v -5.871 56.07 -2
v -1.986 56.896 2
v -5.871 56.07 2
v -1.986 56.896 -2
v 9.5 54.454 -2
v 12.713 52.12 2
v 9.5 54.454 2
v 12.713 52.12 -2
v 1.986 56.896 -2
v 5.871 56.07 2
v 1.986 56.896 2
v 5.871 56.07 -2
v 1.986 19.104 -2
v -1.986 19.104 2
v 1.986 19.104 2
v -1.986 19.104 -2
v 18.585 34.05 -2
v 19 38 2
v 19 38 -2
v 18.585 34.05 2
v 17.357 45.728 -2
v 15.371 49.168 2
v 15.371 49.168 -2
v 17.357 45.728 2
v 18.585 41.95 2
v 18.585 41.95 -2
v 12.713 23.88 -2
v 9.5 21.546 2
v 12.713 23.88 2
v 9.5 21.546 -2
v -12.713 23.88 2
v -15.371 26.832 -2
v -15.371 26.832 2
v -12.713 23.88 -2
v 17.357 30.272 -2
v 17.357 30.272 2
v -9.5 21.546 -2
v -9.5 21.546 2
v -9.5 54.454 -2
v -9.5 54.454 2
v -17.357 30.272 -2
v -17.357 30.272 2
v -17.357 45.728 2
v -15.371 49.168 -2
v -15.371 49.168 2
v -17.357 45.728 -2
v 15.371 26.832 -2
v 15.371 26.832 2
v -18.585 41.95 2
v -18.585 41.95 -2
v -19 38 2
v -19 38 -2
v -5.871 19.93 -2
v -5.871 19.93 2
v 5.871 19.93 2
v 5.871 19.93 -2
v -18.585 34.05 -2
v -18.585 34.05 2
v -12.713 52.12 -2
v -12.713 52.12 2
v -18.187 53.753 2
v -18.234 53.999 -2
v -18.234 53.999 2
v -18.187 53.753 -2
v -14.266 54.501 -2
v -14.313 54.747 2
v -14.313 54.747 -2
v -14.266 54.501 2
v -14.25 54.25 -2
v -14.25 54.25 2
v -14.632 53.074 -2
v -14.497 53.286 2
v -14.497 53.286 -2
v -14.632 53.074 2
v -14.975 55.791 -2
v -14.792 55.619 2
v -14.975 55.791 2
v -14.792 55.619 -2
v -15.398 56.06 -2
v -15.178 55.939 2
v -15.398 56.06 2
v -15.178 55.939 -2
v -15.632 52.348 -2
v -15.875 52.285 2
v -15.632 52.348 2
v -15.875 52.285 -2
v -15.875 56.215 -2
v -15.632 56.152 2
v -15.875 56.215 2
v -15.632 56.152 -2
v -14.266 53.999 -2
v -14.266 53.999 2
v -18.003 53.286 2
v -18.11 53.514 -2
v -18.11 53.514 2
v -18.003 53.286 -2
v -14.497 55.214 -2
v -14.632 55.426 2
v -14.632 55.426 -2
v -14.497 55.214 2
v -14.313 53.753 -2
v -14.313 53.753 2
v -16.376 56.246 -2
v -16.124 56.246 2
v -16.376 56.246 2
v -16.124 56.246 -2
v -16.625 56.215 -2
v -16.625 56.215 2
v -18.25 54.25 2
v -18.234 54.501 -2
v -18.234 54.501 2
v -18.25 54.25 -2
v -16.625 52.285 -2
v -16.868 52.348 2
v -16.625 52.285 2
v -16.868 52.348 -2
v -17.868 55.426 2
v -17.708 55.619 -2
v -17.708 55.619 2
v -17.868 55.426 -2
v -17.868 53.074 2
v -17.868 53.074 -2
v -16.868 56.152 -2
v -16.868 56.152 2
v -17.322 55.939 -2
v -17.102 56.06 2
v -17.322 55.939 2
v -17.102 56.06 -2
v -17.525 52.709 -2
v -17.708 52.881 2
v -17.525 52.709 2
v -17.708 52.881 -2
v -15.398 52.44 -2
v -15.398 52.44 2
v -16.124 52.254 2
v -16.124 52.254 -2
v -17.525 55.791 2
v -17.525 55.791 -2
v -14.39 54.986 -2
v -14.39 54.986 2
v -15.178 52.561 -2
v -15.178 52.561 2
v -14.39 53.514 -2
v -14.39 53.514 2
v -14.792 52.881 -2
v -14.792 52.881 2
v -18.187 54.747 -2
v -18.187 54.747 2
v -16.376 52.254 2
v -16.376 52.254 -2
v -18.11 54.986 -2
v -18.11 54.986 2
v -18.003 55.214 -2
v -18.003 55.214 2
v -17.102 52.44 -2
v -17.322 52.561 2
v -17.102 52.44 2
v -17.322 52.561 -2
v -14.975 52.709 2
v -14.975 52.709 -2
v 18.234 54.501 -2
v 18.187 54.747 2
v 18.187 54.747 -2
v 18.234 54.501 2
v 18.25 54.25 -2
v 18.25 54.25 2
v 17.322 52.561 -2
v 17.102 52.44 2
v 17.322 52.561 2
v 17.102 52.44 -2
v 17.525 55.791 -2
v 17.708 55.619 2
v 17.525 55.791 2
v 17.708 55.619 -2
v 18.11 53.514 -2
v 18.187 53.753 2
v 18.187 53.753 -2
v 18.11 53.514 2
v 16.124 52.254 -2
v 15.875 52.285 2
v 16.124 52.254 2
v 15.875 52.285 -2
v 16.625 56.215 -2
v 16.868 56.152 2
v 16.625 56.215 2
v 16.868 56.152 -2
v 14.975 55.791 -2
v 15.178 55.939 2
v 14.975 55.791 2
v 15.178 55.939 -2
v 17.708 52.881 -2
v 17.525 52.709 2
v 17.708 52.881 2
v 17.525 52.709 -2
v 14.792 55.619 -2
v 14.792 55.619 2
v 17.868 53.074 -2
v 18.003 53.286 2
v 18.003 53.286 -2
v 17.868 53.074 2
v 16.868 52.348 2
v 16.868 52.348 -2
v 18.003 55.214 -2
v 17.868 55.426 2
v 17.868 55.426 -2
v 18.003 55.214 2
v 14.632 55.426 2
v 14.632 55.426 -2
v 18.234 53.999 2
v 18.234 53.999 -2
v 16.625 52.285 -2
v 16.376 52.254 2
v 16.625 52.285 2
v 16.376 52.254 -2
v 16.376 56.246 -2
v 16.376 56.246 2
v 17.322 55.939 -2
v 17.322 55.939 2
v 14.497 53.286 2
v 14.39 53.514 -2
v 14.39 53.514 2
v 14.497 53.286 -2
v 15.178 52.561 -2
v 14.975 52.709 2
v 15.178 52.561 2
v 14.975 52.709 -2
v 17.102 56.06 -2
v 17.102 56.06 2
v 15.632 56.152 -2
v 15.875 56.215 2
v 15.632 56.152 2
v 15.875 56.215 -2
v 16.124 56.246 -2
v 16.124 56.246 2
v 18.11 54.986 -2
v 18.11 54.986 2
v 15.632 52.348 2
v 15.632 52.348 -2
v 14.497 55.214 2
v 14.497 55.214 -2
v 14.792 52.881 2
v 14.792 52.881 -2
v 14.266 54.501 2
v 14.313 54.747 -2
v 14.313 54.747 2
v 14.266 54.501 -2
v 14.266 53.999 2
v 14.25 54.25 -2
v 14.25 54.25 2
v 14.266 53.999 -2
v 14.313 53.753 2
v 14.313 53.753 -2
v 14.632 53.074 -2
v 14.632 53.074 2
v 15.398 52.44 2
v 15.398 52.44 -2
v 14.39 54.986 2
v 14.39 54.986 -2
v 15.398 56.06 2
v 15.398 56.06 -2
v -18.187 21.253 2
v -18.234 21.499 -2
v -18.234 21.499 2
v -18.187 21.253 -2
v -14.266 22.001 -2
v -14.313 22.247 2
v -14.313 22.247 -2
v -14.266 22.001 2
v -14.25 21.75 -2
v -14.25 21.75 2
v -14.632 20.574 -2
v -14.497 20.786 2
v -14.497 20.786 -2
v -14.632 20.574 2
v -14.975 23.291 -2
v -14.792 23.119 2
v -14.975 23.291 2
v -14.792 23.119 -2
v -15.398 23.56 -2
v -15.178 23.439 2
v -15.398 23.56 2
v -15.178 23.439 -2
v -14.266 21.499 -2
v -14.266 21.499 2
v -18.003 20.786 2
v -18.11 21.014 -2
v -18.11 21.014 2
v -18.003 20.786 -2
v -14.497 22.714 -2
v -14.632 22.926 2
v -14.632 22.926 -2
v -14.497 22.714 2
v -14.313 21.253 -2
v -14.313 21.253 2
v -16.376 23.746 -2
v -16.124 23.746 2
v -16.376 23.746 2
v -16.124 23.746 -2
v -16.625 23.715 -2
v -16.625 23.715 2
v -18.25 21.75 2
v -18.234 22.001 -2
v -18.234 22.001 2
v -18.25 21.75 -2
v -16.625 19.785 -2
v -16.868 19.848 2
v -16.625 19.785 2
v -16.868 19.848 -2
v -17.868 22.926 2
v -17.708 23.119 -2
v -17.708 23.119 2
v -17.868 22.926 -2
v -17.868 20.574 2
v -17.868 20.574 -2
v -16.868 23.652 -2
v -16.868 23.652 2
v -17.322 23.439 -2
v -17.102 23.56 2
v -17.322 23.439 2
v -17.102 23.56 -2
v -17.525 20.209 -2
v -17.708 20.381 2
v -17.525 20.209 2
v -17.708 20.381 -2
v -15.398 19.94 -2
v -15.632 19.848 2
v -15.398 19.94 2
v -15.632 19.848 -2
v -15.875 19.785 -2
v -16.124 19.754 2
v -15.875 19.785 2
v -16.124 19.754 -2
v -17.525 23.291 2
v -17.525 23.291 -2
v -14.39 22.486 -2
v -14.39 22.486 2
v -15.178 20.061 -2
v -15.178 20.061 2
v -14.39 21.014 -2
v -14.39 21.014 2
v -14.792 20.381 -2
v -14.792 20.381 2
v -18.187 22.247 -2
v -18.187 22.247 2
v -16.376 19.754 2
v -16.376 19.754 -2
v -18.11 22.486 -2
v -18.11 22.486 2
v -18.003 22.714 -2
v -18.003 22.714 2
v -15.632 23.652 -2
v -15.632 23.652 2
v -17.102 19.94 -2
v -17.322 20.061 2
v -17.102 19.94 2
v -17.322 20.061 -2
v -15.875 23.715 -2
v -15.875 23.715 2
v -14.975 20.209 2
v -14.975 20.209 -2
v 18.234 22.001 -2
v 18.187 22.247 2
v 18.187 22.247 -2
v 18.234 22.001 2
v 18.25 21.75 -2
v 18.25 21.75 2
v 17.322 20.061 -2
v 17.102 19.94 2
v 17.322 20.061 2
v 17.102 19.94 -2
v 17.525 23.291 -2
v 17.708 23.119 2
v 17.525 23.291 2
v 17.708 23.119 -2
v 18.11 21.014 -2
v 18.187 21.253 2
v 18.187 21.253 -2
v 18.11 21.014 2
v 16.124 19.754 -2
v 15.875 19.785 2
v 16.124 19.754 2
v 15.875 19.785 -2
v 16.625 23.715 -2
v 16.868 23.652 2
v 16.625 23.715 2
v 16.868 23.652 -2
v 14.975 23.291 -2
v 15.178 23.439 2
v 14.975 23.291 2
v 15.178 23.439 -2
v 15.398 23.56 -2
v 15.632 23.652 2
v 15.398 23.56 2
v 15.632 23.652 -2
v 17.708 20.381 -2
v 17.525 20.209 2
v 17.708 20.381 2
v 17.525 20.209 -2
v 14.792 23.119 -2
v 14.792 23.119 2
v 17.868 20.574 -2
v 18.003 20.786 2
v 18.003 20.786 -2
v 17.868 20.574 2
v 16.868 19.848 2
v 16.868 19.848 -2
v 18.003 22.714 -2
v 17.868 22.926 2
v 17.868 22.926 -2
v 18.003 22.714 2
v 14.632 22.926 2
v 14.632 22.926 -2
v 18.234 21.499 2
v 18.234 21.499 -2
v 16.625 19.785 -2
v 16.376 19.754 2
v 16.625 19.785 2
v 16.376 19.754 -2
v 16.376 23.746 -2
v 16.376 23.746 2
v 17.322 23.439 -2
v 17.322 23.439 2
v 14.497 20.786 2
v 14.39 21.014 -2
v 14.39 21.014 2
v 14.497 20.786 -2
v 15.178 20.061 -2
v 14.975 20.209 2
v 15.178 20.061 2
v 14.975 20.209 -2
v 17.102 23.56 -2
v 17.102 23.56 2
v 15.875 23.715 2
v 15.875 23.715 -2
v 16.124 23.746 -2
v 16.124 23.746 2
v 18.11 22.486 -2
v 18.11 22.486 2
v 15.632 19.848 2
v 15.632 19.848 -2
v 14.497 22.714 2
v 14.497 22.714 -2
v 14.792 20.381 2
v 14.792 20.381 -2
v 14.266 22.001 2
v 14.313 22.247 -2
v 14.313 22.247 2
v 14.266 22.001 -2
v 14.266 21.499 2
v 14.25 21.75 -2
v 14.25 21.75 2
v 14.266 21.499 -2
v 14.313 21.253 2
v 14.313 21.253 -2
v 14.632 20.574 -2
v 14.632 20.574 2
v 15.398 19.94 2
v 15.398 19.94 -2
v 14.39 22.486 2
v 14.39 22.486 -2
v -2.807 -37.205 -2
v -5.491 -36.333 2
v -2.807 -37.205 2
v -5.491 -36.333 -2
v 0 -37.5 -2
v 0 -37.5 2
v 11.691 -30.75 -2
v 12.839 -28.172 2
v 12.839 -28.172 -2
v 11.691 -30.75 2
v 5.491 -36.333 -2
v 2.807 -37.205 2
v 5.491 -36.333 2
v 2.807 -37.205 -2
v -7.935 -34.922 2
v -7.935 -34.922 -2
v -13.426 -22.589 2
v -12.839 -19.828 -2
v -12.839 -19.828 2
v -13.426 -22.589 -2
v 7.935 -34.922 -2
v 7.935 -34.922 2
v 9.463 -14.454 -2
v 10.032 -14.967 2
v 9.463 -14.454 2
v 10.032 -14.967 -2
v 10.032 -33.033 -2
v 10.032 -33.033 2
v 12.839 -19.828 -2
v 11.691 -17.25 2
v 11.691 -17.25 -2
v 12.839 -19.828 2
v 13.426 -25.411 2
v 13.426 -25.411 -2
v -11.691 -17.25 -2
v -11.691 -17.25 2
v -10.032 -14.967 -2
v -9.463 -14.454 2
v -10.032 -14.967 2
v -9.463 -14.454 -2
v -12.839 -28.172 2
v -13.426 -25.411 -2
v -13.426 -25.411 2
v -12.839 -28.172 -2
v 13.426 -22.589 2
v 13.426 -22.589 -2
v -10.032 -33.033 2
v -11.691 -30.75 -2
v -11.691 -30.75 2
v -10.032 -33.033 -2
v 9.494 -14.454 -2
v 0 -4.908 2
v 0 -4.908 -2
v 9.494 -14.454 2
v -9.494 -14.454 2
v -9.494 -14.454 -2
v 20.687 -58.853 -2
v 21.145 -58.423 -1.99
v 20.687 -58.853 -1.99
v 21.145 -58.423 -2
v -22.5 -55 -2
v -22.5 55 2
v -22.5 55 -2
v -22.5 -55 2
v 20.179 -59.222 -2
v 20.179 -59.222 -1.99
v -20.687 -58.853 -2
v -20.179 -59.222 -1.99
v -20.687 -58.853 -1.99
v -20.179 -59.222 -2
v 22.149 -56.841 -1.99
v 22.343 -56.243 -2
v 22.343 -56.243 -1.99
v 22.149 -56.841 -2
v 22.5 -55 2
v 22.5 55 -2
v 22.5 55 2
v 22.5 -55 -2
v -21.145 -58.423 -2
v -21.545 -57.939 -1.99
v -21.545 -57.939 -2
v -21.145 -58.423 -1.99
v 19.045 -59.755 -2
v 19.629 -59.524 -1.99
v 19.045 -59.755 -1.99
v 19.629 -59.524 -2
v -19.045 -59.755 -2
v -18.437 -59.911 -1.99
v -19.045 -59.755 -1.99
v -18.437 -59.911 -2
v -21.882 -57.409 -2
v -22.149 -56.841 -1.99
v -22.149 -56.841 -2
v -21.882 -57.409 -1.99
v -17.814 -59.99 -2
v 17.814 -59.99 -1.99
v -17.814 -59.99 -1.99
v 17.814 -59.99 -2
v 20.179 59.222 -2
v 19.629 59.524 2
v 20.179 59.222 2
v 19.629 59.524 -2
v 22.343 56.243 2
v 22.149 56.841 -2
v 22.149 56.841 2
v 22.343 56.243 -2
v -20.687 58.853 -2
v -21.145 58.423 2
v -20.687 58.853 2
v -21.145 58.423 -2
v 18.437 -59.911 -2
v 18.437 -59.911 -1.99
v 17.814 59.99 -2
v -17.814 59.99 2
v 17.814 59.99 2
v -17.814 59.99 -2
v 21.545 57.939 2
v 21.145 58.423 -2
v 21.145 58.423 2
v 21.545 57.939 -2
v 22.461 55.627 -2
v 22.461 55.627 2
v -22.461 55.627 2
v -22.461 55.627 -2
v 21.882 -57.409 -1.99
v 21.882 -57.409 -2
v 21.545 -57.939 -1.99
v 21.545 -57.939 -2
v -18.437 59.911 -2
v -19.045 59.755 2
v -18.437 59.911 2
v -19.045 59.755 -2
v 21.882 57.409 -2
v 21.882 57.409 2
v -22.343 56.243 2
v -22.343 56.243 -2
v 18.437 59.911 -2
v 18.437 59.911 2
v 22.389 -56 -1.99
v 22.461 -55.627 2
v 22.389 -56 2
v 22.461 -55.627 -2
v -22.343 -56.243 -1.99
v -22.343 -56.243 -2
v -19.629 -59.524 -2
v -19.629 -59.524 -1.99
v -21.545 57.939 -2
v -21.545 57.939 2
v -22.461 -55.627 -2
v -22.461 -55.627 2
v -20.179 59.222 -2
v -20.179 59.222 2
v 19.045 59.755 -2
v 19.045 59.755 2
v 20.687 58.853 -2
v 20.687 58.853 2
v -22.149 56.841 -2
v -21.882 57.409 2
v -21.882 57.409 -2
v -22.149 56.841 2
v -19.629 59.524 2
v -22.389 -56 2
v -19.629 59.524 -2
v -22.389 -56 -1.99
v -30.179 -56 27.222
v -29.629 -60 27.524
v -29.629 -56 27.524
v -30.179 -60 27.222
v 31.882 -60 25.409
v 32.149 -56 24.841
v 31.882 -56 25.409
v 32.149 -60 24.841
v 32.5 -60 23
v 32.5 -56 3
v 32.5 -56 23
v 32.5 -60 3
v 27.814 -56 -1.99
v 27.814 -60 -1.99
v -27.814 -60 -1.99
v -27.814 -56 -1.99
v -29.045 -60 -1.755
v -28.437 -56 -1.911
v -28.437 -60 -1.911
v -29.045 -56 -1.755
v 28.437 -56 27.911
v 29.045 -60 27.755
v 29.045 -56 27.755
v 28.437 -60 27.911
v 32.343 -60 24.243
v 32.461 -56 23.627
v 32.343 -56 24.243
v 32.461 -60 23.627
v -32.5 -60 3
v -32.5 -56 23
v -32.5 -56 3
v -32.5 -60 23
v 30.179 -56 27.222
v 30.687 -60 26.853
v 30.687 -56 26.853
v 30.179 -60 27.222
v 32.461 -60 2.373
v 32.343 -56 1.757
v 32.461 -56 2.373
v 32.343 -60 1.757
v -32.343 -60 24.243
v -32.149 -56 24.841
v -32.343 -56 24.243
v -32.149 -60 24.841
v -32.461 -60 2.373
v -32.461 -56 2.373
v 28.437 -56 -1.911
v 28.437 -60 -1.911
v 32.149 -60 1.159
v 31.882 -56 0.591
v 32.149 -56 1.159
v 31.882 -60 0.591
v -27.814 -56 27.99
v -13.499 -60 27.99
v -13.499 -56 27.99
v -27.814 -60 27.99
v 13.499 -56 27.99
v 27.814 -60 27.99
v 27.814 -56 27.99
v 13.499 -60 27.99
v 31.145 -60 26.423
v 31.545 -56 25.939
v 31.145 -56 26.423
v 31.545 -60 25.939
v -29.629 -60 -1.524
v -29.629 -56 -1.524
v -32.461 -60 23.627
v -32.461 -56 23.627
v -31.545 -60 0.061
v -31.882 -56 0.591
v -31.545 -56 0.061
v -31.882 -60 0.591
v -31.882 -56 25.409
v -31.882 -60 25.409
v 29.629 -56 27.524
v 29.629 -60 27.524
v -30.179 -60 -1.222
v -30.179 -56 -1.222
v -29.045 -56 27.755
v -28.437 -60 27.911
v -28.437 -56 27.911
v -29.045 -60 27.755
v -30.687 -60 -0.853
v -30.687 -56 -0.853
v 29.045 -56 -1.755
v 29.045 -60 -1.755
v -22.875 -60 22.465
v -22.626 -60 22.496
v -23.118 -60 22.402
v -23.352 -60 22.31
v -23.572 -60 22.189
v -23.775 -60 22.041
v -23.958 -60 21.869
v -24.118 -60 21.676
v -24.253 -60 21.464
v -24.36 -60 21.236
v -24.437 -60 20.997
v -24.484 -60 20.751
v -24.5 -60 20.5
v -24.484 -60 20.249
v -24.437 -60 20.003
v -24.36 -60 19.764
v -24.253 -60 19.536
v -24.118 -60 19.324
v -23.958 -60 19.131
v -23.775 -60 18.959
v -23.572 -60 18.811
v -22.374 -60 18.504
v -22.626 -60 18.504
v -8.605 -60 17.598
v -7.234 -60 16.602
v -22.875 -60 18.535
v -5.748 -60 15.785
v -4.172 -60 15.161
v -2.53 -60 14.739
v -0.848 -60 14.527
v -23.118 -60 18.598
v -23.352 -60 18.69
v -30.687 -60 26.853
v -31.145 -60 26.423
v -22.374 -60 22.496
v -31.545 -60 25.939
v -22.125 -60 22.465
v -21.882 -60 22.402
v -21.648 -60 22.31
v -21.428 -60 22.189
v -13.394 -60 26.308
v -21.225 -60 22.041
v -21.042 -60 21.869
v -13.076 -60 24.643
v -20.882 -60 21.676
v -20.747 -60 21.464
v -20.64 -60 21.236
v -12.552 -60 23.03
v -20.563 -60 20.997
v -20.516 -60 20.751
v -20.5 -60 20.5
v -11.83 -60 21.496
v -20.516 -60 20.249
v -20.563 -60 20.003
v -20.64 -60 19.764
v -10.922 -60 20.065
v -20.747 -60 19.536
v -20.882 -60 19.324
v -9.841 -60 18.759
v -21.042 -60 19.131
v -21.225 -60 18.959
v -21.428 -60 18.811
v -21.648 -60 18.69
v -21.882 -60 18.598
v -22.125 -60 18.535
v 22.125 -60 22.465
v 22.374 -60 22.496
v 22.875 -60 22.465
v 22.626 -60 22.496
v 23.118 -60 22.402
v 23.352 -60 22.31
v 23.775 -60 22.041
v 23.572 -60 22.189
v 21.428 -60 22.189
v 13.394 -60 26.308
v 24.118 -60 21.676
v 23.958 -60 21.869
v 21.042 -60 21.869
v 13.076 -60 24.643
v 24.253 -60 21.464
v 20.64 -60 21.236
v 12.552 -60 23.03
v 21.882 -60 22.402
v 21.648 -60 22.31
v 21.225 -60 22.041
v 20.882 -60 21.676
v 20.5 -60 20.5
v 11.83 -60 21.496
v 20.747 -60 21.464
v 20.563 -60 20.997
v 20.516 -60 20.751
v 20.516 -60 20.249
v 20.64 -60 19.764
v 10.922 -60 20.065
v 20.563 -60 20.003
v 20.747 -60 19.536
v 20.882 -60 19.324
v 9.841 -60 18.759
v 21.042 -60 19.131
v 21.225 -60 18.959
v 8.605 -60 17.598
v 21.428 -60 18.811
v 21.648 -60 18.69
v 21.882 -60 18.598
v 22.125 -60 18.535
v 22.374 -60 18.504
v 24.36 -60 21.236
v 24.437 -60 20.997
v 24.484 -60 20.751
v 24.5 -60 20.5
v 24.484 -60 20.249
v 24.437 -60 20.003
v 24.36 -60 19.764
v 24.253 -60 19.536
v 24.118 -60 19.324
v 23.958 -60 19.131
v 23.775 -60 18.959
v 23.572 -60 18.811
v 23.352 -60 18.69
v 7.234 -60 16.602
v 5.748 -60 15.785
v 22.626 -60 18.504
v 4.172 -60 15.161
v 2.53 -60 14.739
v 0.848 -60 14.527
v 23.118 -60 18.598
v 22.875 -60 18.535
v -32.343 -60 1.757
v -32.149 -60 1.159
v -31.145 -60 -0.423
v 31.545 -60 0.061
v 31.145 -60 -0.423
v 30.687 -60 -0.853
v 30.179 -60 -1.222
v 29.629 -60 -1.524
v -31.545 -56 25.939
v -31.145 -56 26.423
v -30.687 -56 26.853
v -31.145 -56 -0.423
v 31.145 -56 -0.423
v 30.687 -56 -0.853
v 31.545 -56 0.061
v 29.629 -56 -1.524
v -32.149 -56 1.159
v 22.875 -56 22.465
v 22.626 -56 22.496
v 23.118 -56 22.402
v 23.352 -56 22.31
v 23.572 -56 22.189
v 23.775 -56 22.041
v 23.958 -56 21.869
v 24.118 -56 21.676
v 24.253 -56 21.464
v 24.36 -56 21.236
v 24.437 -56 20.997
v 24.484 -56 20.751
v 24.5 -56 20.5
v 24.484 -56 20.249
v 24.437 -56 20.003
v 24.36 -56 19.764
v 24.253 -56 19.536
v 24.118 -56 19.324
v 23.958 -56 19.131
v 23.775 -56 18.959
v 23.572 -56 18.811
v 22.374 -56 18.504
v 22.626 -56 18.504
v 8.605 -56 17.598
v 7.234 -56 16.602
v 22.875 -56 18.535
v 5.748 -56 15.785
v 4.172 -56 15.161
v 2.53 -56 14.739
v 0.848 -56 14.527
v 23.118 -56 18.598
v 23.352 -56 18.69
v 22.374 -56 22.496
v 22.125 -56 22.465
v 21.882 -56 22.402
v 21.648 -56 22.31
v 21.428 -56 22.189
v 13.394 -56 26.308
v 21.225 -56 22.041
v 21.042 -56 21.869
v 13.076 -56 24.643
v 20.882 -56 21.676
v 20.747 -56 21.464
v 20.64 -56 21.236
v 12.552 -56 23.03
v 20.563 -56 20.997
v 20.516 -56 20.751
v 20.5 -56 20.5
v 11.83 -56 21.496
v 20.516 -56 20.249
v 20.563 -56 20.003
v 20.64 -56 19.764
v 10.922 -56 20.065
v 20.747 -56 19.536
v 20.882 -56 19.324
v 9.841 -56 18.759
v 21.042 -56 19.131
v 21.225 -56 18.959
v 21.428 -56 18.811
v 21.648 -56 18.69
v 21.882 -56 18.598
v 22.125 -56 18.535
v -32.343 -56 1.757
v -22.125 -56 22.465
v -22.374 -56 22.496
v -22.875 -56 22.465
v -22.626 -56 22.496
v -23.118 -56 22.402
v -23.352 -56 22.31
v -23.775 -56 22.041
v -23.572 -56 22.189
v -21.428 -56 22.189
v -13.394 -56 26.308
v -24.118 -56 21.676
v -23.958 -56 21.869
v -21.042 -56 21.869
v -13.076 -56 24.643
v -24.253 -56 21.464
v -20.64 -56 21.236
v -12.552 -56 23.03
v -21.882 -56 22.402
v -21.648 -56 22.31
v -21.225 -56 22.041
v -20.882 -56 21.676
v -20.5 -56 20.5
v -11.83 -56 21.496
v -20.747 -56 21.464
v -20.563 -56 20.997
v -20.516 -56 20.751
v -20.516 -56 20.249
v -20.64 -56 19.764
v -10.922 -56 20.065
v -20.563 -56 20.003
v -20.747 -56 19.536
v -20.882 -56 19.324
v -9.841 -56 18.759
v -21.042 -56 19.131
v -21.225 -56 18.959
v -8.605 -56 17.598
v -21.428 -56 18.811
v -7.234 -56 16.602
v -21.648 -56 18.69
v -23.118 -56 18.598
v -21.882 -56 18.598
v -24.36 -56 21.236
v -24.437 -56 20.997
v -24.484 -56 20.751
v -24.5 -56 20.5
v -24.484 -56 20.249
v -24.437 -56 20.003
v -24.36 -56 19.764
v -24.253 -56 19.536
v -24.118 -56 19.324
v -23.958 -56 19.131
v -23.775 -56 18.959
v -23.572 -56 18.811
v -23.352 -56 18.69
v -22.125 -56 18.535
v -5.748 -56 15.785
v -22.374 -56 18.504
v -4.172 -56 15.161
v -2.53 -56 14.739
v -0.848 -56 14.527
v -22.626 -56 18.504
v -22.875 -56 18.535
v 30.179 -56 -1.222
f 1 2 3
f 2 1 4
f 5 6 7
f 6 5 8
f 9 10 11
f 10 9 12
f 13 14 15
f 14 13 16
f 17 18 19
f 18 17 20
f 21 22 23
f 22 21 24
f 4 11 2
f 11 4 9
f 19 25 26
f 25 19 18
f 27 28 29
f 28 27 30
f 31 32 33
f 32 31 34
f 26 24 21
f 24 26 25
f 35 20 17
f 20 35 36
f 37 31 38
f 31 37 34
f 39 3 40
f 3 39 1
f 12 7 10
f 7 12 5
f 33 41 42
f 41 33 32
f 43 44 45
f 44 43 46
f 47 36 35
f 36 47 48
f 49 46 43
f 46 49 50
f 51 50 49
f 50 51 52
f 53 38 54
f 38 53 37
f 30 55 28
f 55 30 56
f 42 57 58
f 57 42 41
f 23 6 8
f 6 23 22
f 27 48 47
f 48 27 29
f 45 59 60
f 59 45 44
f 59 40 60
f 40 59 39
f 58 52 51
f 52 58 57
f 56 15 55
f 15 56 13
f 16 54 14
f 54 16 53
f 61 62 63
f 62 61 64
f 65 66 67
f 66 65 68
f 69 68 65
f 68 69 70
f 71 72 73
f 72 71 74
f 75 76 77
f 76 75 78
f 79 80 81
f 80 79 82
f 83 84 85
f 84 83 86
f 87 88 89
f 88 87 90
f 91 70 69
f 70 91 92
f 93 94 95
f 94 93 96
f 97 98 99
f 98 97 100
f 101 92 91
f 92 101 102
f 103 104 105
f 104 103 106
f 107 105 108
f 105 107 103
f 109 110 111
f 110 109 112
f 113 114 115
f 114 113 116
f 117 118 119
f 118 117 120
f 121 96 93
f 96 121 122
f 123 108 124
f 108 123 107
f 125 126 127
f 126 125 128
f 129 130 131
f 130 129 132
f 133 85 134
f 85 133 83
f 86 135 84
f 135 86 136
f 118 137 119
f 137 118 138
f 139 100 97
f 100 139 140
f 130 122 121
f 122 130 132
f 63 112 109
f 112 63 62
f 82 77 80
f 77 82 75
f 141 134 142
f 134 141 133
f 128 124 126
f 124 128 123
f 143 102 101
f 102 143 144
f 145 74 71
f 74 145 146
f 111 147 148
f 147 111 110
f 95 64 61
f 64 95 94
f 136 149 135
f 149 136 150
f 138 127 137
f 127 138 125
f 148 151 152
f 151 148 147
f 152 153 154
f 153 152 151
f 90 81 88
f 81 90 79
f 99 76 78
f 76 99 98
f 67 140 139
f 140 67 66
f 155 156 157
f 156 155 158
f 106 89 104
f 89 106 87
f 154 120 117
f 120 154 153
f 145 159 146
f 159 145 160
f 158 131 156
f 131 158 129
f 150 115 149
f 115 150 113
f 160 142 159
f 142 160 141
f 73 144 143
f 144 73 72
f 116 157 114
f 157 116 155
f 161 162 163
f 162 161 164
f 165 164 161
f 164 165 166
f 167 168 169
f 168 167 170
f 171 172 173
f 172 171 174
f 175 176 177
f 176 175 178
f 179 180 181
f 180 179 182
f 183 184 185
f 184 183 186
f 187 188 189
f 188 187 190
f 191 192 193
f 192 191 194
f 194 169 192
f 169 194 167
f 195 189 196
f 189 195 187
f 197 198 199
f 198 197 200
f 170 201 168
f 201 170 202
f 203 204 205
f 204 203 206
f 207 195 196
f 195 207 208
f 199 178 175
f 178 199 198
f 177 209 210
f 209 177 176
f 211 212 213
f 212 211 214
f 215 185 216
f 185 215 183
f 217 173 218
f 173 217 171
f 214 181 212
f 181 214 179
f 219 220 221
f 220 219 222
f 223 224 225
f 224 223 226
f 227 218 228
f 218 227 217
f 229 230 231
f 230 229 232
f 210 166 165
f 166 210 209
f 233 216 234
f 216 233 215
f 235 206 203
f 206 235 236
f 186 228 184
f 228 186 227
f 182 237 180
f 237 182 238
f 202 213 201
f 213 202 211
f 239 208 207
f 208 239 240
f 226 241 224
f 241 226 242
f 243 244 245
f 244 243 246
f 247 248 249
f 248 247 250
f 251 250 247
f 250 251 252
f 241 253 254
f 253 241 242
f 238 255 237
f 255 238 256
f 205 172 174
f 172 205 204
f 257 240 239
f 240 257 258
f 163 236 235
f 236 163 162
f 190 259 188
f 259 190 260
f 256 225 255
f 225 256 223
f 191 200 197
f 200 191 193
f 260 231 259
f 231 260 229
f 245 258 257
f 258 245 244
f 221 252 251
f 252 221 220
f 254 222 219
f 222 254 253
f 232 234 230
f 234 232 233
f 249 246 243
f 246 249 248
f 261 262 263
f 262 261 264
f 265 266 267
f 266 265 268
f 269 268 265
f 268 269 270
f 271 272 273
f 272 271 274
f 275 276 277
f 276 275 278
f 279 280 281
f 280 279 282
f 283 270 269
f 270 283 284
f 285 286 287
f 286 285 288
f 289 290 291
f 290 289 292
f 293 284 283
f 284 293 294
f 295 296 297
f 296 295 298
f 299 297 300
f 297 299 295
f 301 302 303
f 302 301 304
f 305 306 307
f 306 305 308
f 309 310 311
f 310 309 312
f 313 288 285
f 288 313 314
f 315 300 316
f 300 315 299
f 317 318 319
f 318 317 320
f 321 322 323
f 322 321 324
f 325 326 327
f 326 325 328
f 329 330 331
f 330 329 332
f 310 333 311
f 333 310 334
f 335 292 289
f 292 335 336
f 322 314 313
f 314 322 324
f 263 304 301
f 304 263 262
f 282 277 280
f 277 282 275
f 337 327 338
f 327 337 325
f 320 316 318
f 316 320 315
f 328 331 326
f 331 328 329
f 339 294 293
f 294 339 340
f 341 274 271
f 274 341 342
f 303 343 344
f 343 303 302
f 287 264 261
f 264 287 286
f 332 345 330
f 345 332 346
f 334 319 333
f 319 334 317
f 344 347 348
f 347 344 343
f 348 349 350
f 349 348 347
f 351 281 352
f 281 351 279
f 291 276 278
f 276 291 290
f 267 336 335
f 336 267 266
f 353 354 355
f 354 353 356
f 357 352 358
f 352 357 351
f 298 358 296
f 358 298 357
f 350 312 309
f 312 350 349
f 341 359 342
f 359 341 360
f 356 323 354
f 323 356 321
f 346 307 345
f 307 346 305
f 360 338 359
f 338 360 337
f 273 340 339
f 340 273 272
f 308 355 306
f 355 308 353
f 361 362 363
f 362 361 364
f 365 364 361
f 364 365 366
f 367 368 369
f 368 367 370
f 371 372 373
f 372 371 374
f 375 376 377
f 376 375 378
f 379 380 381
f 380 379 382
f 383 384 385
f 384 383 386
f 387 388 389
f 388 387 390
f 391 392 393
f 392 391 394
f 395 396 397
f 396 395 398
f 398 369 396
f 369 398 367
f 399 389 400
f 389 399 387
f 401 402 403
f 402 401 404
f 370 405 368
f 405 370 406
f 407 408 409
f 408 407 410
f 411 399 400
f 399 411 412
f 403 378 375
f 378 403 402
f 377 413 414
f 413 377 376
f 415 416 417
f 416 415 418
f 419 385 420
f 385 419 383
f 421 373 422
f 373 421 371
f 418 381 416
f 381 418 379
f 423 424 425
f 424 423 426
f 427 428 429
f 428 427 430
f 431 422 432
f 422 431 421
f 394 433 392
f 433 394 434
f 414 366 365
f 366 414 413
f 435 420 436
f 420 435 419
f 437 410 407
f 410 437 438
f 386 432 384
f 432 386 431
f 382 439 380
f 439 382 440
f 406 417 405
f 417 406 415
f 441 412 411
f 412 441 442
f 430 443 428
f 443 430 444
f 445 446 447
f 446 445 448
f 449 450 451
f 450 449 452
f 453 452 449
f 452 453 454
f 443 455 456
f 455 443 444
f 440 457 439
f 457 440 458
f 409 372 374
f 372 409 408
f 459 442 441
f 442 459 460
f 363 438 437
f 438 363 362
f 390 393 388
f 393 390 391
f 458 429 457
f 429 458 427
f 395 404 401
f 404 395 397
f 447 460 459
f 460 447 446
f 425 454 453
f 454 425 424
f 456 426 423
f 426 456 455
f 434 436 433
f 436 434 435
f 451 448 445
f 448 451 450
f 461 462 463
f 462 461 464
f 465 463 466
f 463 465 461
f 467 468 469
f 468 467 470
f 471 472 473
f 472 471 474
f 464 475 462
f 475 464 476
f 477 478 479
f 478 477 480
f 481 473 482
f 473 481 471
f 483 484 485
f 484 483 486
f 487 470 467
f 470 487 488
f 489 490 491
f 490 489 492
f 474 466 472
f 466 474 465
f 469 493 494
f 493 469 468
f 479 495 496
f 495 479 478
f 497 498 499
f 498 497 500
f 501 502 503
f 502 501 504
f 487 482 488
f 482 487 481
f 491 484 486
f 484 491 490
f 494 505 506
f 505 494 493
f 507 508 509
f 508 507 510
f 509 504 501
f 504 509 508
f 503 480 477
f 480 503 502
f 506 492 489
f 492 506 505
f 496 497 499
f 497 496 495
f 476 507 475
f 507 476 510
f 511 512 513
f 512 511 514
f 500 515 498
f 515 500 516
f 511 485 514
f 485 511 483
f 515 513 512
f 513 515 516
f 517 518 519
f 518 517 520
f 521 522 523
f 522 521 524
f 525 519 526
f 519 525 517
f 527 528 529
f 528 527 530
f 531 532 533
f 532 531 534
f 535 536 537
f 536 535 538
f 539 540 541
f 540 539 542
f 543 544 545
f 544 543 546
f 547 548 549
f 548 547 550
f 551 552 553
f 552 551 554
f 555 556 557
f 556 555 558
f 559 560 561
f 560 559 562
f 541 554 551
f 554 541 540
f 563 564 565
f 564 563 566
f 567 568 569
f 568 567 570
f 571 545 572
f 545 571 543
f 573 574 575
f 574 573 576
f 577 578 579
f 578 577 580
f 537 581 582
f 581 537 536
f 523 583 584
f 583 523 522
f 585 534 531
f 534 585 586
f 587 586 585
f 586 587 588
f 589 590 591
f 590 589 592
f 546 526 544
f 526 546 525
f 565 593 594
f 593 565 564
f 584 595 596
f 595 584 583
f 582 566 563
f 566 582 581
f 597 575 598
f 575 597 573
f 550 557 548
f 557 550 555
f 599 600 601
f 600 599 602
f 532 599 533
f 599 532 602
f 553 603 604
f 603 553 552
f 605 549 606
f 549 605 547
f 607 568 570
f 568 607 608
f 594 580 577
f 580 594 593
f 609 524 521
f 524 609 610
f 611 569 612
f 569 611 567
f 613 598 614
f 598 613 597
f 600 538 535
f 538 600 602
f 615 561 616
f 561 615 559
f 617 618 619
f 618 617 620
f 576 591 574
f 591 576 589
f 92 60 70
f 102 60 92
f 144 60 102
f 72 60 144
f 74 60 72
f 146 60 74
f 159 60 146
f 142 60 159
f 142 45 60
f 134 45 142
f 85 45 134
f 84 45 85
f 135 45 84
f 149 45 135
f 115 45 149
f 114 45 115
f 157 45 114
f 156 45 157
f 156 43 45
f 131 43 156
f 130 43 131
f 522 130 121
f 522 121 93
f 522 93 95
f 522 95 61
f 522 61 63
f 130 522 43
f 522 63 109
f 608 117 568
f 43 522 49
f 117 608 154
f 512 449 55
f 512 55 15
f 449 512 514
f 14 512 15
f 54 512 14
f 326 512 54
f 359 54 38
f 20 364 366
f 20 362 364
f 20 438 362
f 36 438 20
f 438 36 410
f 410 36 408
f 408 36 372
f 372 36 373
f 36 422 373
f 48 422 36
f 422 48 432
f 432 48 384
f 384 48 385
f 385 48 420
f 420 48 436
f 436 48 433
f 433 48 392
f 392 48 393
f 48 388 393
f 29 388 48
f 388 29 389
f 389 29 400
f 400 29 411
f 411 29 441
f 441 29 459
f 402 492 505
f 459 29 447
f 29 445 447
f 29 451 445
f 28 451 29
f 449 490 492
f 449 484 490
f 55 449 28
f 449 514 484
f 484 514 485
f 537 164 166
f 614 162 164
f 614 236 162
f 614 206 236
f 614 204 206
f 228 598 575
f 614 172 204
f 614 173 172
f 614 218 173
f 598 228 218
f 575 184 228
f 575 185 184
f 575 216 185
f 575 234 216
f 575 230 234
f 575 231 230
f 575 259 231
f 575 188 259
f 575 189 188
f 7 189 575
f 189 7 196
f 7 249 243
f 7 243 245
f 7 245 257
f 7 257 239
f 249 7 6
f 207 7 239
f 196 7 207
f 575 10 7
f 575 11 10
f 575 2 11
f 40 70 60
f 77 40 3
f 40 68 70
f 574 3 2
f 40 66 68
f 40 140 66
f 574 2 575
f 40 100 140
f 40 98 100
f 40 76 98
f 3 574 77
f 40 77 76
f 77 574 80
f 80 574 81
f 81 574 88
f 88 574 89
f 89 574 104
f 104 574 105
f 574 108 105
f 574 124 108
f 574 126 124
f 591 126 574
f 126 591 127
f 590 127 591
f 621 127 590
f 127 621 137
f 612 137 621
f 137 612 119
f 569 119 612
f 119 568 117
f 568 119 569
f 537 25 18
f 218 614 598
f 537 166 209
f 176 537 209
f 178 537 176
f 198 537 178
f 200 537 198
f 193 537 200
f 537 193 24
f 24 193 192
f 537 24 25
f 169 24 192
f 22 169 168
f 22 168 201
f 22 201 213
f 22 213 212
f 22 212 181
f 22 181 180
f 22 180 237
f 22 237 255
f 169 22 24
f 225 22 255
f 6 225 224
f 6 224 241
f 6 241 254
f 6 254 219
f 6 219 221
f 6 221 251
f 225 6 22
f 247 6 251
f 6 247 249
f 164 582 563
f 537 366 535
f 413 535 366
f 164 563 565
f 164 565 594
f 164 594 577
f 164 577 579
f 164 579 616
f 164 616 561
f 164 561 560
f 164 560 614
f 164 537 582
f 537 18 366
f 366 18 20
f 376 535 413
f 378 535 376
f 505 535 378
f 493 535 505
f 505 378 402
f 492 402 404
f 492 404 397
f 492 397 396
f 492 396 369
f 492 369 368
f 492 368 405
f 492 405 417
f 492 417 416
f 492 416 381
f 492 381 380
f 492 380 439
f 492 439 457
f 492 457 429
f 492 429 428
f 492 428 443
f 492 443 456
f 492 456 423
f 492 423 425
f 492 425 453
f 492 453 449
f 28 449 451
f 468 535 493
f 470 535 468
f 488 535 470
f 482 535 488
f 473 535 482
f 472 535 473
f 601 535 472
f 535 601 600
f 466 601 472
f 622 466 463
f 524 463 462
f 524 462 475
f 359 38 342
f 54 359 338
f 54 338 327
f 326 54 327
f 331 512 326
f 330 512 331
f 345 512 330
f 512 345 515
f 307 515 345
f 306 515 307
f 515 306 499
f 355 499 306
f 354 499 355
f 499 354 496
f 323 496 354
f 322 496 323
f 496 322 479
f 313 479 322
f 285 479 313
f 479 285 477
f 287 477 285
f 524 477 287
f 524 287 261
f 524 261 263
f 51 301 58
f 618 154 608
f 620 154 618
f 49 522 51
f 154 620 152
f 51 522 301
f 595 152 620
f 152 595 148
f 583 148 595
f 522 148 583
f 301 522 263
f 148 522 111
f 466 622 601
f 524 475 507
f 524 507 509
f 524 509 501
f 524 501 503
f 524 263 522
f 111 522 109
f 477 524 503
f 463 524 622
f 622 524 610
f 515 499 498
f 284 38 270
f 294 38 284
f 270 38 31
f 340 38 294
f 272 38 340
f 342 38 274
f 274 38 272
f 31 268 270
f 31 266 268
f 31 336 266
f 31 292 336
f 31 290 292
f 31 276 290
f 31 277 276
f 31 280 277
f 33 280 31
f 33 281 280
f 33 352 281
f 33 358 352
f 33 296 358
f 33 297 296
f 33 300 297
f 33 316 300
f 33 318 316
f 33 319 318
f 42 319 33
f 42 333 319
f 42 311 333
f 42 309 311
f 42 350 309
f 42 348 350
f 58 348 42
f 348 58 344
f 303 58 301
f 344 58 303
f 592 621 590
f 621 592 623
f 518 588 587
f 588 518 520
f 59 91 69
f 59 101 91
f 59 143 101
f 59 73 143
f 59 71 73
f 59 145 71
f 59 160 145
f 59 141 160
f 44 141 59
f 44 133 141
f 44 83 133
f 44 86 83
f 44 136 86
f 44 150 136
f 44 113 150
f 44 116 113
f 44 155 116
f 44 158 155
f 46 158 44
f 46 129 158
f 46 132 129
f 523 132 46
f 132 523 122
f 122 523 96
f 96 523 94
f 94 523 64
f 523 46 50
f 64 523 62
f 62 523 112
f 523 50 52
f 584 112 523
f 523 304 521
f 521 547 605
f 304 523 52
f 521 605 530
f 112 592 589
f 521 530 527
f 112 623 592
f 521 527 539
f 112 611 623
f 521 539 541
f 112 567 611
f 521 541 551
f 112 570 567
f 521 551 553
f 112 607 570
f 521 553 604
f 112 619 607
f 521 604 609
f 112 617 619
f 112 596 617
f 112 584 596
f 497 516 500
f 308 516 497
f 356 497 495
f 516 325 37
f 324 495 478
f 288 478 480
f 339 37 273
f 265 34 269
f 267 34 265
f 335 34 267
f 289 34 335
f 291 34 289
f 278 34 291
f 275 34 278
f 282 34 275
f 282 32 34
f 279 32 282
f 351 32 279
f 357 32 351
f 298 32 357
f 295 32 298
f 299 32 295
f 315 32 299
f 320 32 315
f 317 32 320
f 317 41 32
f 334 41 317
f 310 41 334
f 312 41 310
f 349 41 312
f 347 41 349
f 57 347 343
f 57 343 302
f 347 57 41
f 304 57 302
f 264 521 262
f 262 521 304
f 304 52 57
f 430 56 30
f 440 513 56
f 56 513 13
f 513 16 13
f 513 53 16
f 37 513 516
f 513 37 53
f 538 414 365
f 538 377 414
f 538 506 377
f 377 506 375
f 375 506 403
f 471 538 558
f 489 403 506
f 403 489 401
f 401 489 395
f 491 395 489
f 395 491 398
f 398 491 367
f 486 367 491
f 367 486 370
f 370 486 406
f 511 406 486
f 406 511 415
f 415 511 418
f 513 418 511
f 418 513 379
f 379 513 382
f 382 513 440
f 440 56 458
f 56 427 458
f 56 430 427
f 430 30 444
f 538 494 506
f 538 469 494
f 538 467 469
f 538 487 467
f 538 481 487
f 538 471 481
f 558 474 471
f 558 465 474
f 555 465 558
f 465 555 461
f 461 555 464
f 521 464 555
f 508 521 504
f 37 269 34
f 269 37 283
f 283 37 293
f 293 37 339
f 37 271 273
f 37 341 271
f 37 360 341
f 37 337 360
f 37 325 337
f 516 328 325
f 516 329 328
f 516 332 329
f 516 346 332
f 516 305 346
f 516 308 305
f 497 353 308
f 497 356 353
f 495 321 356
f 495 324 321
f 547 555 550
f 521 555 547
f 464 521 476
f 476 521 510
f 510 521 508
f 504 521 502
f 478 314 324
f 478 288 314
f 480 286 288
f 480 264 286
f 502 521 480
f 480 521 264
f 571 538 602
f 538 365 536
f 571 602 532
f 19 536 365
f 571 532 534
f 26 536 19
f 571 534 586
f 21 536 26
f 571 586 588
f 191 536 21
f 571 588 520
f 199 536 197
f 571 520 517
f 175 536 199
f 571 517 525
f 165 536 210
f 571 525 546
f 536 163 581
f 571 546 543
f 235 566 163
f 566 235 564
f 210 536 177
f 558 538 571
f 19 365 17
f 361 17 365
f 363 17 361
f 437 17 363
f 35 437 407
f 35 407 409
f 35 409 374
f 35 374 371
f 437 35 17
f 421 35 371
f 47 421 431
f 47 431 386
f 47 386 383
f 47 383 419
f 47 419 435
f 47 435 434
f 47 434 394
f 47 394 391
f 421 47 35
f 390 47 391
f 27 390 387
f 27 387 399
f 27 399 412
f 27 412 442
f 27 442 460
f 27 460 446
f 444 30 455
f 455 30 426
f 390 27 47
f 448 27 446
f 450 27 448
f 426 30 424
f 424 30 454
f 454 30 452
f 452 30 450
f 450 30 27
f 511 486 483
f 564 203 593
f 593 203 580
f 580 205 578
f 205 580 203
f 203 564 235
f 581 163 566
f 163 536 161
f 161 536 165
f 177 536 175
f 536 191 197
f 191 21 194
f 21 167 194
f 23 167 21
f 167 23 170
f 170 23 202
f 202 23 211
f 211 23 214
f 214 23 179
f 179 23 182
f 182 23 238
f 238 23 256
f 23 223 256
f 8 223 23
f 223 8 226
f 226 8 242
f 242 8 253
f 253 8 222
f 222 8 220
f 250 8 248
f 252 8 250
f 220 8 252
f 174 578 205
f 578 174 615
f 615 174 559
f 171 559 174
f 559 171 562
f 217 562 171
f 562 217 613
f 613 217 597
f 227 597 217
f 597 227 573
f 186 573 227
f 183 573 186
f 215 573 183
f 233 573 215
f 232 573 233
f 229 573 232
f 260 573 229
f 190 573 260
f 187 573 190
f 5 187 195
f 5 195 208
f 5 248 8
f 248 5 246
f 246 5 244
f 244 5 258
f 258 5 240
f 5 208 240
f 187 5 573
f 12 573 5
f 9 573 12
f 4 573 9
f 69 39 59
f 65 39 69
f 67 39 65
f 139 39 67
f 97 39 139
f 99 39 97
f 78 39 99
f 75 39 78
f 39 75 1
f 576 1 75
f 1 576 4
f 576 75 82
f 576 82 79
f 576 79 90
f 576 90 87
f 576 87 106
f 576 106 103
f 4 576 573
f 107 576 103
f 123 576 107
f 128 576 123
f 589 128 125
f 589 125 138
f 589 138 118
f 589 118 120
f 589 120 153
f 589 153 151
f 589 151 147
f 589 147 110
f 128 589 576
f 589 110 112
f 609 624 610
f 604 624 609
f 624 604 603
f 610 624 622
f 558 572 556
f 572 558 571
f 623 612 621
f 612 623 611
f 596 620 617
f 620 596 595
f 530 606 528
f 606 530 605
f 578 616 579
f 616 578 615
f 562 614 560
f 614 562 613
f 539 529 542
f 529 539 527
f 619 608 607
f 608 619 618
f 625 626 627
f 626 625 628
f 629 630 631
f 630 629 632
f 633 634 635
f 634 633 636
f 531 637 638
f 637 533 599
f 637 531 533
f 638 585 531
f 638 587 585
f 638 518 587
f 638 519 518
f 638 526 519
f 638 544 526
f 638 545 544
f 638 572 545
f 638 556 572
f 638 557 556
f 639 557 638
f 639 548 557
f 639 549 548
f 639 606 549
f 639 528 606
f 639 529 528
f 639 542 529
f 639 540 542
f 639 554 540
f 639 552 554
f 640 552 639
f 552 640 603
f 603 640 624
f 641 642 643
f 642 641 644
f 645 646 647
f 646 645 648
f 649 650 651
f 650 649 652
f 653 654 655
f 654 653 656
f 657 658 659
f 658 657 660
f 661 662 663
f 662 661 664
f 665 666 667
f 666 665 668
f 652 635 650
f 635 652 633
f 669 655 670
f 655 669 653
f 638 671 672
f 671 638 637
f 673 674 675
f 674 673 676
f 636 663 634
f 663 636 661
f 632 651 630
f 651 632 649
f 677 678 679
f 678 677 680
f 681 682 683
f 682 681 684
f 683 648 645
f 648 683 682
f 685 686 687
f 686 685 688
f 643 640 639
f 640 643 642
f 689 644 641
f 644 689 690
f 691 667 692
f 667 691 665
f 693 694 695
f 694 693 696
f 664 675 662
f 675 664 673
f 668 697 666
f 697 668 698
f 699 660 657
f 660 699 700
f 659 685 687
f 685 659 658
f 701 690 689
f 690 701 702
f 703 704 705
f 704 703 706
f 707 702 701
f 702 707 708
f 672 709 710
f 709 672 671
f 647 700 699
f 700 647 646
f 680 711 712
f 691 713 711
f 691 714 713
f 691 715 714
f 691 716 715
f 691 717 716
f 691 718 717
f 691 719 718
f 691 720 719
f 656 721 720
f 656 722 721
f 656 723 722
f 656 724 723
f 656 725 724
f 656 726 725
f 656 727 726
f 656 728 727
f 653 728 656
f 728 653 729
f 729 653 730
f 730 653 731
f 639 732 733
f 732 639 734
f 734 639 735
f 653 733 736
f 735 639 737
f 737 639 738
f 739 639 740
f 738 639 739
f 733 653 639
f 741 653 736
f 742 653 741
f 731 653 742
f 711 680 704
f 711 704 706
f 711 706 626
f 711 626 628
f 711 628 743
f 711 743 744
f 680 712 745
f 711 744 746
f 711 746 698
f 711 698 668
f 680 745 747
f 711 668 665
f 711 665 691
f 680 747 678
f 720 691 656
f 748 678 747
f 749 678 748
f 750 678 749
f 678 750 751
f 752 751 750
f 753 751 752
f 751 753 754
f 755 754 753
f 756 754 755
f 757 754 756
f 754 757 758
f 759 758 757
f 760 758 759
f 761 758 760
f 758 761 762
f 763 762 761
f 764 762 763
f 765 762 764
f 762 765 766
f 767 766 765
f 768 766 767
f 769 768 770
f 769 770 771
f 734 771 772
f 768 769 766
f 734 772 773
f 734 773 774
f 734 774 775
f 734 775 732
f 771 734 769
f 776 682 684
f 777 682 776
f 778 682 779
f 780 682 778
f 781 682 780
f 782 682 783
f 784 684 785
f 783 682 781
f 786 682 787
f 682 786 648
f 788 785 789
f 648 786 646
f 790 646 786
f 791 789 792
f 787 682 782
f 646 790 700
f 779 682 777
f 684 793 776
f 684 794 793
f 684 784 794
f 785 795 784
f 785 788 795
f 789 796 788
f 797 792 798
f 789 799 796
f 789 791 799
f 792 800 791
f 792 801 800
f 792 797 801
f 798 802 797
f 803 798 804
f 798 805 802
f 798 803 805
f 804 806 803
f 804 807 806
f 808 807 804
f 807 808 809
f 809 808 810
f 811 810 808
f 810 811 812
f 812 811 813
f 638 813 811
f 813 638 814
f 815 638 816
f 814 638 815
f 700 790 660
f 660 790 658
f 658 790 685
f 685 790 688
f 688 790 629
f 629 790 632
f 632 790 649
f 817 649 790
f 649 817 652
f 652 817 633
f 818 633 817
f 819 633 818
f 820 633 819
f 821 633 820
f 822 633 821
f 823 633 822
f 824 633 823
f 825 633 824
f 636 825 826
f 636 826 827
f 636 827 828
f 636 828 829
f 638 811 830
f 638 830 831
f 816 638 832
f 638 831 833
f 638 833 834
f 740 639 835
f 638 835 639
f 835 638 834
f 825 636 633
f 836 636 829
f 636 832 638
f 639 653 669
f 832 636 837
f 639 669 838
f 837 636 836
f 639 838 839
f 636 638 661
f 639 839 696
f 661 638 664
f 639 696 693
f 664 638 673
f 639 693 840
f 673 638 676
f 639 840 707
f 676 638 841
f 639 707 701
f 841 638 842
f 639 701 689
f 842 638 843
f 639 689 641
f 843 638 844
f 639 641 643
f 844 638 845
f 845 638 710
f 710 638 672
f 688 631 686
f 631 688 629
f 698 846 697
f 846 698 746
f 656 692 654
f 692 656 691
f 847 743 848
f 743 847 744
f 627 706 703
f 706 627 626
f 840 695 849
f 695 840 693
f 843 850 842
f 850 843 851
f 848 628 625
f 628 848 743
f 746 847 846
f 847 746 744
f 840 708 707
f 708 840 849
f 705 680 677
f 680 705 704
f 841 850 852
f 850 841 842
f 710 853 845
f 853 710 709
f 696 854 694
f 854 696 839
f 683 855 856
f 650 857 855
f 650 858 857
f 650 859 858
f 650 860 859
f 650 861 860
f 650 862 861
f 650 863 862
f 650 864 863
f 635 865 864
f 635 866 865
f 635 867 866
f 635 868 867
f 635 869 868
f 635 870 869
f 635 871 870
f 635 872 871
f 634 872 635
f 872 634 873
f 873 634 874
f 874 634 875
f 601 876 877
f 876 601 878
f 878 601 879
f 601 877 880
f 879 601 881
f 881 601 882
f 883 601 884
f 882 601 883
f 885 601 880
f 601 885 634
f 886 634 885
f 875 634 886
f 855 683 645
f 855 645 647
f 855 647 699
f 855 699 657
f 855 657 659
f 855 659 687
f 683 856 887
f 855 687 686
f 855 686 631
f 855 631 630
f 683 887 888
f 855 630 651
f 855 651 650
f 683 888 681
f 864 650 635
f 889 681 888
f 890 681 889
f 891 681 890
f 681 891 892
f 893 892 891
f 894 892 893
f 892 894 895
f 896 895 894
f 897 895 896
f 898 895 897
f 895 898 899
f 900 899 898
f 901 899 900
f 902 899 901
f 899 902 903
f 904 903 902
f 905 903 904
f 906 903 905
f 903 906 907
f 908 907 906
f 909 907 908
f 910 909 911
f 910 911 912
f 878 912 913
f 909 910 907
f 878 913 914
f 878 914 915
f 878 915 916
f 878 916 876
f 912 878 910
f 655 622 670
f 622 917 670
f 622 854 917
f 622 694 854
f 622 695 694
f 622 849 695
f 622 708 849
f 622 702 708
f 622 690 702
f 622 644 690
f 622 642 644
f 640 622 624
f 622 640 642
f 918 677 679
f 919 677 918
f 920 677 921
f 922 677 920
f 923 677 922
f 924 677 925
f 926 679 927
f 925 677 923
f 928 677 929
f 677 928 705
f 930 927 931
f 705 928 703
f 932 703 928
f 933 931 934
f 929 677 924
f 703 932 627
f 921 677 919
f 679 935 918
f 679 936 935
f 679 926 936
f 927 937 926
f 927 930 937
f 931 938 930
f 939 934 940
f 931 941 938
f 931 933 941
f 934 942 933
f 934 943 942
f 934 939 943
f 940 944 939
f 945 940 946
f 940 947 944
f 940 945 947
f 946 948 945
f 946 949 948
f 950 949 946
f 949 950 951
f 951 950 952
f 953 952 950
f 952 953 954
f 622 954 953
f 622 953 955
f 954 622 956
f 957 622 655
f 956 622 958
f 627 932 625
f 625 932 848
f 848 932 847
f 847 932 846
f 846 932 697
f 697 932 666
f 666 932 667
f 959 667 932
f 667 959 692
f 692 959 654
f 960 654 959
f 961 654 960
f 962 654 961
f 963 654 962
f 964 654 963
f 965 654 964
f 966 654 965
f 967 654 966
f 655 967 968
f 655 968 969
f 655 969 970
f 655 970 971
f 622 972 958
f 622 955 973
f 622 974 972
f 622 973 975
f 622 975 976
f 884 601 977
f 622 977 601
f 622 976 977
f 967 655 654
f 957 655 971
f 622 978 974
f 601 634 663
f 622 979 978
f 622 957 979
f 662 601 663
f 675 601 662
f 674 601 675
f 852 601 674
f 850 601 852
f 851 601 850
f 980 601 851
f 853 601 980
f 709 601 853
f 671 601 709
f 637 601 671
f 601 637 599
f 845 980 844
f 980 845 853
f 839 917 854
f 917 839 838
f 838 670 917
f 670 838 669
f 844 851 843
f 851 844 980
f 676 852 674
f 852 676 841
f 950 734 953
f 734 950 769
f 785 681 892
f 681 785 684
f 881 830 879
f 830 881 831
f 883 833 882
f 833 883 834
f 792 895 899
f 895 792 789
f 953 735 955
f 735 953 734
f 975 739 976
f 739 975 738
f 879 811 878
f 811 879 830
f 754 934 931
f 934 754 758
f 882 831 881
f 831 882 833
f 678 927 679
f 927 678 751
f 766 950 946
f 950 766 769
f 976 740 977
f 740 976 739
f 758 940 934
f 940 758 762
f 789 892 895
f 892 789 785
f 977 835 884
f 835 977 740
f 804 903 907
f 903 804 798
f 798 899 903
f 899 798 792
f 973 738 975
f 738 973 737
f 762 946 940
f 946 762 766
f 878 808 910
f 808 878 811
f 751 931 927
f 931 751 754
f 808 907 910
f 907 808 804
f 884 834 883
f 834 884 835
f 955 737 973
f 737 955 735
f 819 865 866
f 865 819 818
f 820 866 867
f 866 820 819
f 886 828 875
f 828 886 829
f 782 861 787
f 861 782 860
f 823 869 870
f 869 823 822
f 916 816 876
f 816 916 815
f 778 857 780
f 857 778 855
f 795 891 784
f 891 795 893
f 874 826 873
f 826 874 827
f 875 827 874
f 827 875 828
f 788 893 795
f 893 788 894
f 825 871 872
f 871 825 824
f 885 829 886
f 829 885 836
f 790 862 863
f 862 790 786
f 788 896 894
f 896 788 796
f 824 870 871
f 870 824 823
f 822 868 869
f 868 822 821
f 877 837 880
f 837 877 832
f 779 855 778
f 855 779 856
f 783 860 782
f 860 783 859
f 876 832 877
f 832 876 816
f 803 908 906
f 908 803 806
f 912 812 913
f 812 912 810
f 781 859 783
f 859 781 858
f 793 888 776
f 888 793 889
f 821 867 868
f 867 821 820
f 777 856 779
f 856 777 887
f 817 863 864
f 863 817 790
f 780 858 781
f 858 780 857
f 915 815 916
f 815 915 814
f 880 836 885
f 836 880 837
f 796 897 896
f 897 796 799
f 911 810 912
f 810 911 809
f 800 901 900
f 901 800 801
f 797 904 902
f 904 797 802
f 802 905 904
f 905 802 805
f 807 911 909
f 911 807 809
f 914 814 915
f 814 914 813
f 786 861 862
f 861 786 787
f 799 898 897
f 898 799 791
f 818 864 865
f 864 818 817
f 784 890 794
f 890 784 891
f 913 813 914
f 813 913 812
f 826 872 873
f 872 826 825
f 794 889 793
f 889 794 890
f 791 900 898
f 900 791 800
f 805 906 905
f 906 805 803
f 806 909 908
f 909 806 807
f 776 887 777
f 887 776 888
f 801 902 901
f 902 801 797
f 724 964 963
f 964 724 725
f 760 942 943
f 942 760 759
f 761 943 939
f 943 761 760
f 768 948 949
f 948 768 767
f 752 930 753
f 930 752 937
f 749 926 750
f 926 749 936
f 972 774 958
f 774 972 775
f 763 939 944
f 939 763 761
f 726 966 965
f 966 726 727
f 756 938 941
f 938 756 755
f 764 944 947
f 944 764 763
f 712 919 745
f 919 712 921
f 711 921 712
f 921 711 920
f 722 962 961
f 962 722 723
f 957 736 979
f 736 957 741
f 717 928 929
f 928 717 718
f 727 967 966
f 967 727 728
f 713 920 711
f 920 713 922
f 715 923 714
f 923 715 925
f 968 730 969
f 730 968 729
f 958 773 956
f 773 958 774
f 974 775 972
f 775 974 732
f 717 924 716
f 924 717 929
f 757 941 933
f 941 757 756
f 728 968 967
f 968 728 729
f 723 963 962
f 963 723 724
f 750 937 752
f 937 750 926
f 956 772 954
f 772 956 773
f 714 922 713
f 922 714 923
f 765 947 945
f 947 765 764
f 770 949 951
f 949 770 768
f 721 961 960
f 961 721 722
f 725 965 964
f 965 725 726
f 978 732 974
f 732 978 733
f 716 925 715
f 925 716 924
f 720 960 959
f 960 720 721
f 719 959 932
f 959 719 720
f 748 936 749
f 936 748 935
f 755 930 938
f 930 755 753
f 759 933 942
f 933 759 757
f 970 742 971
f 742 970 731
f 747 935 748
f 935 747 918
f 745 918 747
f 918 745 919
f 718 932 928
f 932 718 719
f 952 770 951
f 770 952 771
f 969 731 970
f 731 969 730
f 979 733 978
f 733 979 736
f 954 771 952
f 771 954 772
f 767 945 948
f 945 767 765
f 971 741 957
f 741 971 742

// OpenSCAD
use <MCAD/teardrop.scad>

Lx = 45;
Ly = 120;
Lbase = 30;
thick = 4;
fanX = 32.5;
dVentilo = 38;
union() {
    // Partie haute et longue, allongée 
    difference() { 
        roundedBox(Lx,Ly,thick,5);
        // Trou pour la ventilation + vis
       translate([0,0.5*(Ly-dVentilo)-3,-thick])  {
            //translate([0,0.5*(Ly-dVentilo)-10,0]) cylinder(h=2*thick, d=dVentilo);
            // Ventilation
            cylinder(h=2*thick, d=dVentilo);
            // 4 Vis 
            translate([-0.5*fanX,0.5*fanX, 0]) cylinder(h=2*thick,d=4, $fn=50);
            translate([0.5*fanX,0.5*fanX, 0]) cylinder(h=2*thick,d=4, $fn=50);
            translate([-0.5*fanX,-0.5*fanX, 0]) cylinder(h=2*thick,d=4, $fn=50);
            translate([0.5*fanX,-0.5*fanX, 0]) cylinder(h=2*thick,d=4, $fn=50);
        }
        //translate([-0.5*fanX,0,-thick]) hull() { 
                
        //        translate([0,0.45*Ly-fanX,0]) cylinder(h=2*thick,d=4, $fn=50);
        //    };
        /*translate([0.5*fanX,0,-thick]) hull() { 
                translate([0,0.45*Ly-fanX-15,0]) cylinder(h=2*thick,d=4, $fn=50);
                translate([0,0.45*Ly,0]) cylinder(h=2*thick,d=4, $fn=50);
            };
        
        // 
        translate([0,0.45*Ly-fanX-15,-thick]) hull() {
            translate([0,0.5*(Ly-dVentilo)-10,0]) cylinder(h=2*thick, d=dVentilo);
            translate([0,0.5*(Ly-dVentilo)-12,0]) cylinder(h=2*thick, d=dVentilo);
        }*/
            
        // Goutte pour avoir un peu moins de matière
        #translate([0, -0.2*Ly, 0]) rotate([0, 90, 90]) 
            teardrop(0.3*Lx, 2*thick, 90);
    }
    // base au sol (vertical)
    translate([0,-(Ly-thick)/2,(Lbase-thick)/2]) rotate([90,0,0]) 
    difference() { 
        // Base
        roundedBox(Lx+20,Lbase,thick,5);
        // Trou pour utiliser moins de matière
        #translate([0, 0.5*Lbase,-thick]) cylinder(h=2*thick,r=0.3*Lx, $fn=50);
        // Trous des vis
        #translate([0.5*Lx,0.25*Lbase, -thick]) cylinder(h=thick*2, d=4, $fn=50);
        #translate([-0.5*Lx,0.25*Lbase, -thick]) cylinder(h=thick*2, d=4, $fn=50);
    };

}


module roundedBox(x,y,z,rad){
	hull() {
        translate([-x/2+rad, y/2-rad,-z/2]) cylinder(h=z,r=rad, $fn=50);
        translate([ x/2-rad, y/2-rad,-z/2]) cylinder(h=z,r=rad, $fn=50);
        translate([-x/2+rad,-y/2+rad,-z/2]) cylinder(h=z,r=rad, $fn=50);
        translate([ x/2-rad,-y/2+rad,-z/2]) cylinder(h=z,r=rad, $fn=50);
   }
}
